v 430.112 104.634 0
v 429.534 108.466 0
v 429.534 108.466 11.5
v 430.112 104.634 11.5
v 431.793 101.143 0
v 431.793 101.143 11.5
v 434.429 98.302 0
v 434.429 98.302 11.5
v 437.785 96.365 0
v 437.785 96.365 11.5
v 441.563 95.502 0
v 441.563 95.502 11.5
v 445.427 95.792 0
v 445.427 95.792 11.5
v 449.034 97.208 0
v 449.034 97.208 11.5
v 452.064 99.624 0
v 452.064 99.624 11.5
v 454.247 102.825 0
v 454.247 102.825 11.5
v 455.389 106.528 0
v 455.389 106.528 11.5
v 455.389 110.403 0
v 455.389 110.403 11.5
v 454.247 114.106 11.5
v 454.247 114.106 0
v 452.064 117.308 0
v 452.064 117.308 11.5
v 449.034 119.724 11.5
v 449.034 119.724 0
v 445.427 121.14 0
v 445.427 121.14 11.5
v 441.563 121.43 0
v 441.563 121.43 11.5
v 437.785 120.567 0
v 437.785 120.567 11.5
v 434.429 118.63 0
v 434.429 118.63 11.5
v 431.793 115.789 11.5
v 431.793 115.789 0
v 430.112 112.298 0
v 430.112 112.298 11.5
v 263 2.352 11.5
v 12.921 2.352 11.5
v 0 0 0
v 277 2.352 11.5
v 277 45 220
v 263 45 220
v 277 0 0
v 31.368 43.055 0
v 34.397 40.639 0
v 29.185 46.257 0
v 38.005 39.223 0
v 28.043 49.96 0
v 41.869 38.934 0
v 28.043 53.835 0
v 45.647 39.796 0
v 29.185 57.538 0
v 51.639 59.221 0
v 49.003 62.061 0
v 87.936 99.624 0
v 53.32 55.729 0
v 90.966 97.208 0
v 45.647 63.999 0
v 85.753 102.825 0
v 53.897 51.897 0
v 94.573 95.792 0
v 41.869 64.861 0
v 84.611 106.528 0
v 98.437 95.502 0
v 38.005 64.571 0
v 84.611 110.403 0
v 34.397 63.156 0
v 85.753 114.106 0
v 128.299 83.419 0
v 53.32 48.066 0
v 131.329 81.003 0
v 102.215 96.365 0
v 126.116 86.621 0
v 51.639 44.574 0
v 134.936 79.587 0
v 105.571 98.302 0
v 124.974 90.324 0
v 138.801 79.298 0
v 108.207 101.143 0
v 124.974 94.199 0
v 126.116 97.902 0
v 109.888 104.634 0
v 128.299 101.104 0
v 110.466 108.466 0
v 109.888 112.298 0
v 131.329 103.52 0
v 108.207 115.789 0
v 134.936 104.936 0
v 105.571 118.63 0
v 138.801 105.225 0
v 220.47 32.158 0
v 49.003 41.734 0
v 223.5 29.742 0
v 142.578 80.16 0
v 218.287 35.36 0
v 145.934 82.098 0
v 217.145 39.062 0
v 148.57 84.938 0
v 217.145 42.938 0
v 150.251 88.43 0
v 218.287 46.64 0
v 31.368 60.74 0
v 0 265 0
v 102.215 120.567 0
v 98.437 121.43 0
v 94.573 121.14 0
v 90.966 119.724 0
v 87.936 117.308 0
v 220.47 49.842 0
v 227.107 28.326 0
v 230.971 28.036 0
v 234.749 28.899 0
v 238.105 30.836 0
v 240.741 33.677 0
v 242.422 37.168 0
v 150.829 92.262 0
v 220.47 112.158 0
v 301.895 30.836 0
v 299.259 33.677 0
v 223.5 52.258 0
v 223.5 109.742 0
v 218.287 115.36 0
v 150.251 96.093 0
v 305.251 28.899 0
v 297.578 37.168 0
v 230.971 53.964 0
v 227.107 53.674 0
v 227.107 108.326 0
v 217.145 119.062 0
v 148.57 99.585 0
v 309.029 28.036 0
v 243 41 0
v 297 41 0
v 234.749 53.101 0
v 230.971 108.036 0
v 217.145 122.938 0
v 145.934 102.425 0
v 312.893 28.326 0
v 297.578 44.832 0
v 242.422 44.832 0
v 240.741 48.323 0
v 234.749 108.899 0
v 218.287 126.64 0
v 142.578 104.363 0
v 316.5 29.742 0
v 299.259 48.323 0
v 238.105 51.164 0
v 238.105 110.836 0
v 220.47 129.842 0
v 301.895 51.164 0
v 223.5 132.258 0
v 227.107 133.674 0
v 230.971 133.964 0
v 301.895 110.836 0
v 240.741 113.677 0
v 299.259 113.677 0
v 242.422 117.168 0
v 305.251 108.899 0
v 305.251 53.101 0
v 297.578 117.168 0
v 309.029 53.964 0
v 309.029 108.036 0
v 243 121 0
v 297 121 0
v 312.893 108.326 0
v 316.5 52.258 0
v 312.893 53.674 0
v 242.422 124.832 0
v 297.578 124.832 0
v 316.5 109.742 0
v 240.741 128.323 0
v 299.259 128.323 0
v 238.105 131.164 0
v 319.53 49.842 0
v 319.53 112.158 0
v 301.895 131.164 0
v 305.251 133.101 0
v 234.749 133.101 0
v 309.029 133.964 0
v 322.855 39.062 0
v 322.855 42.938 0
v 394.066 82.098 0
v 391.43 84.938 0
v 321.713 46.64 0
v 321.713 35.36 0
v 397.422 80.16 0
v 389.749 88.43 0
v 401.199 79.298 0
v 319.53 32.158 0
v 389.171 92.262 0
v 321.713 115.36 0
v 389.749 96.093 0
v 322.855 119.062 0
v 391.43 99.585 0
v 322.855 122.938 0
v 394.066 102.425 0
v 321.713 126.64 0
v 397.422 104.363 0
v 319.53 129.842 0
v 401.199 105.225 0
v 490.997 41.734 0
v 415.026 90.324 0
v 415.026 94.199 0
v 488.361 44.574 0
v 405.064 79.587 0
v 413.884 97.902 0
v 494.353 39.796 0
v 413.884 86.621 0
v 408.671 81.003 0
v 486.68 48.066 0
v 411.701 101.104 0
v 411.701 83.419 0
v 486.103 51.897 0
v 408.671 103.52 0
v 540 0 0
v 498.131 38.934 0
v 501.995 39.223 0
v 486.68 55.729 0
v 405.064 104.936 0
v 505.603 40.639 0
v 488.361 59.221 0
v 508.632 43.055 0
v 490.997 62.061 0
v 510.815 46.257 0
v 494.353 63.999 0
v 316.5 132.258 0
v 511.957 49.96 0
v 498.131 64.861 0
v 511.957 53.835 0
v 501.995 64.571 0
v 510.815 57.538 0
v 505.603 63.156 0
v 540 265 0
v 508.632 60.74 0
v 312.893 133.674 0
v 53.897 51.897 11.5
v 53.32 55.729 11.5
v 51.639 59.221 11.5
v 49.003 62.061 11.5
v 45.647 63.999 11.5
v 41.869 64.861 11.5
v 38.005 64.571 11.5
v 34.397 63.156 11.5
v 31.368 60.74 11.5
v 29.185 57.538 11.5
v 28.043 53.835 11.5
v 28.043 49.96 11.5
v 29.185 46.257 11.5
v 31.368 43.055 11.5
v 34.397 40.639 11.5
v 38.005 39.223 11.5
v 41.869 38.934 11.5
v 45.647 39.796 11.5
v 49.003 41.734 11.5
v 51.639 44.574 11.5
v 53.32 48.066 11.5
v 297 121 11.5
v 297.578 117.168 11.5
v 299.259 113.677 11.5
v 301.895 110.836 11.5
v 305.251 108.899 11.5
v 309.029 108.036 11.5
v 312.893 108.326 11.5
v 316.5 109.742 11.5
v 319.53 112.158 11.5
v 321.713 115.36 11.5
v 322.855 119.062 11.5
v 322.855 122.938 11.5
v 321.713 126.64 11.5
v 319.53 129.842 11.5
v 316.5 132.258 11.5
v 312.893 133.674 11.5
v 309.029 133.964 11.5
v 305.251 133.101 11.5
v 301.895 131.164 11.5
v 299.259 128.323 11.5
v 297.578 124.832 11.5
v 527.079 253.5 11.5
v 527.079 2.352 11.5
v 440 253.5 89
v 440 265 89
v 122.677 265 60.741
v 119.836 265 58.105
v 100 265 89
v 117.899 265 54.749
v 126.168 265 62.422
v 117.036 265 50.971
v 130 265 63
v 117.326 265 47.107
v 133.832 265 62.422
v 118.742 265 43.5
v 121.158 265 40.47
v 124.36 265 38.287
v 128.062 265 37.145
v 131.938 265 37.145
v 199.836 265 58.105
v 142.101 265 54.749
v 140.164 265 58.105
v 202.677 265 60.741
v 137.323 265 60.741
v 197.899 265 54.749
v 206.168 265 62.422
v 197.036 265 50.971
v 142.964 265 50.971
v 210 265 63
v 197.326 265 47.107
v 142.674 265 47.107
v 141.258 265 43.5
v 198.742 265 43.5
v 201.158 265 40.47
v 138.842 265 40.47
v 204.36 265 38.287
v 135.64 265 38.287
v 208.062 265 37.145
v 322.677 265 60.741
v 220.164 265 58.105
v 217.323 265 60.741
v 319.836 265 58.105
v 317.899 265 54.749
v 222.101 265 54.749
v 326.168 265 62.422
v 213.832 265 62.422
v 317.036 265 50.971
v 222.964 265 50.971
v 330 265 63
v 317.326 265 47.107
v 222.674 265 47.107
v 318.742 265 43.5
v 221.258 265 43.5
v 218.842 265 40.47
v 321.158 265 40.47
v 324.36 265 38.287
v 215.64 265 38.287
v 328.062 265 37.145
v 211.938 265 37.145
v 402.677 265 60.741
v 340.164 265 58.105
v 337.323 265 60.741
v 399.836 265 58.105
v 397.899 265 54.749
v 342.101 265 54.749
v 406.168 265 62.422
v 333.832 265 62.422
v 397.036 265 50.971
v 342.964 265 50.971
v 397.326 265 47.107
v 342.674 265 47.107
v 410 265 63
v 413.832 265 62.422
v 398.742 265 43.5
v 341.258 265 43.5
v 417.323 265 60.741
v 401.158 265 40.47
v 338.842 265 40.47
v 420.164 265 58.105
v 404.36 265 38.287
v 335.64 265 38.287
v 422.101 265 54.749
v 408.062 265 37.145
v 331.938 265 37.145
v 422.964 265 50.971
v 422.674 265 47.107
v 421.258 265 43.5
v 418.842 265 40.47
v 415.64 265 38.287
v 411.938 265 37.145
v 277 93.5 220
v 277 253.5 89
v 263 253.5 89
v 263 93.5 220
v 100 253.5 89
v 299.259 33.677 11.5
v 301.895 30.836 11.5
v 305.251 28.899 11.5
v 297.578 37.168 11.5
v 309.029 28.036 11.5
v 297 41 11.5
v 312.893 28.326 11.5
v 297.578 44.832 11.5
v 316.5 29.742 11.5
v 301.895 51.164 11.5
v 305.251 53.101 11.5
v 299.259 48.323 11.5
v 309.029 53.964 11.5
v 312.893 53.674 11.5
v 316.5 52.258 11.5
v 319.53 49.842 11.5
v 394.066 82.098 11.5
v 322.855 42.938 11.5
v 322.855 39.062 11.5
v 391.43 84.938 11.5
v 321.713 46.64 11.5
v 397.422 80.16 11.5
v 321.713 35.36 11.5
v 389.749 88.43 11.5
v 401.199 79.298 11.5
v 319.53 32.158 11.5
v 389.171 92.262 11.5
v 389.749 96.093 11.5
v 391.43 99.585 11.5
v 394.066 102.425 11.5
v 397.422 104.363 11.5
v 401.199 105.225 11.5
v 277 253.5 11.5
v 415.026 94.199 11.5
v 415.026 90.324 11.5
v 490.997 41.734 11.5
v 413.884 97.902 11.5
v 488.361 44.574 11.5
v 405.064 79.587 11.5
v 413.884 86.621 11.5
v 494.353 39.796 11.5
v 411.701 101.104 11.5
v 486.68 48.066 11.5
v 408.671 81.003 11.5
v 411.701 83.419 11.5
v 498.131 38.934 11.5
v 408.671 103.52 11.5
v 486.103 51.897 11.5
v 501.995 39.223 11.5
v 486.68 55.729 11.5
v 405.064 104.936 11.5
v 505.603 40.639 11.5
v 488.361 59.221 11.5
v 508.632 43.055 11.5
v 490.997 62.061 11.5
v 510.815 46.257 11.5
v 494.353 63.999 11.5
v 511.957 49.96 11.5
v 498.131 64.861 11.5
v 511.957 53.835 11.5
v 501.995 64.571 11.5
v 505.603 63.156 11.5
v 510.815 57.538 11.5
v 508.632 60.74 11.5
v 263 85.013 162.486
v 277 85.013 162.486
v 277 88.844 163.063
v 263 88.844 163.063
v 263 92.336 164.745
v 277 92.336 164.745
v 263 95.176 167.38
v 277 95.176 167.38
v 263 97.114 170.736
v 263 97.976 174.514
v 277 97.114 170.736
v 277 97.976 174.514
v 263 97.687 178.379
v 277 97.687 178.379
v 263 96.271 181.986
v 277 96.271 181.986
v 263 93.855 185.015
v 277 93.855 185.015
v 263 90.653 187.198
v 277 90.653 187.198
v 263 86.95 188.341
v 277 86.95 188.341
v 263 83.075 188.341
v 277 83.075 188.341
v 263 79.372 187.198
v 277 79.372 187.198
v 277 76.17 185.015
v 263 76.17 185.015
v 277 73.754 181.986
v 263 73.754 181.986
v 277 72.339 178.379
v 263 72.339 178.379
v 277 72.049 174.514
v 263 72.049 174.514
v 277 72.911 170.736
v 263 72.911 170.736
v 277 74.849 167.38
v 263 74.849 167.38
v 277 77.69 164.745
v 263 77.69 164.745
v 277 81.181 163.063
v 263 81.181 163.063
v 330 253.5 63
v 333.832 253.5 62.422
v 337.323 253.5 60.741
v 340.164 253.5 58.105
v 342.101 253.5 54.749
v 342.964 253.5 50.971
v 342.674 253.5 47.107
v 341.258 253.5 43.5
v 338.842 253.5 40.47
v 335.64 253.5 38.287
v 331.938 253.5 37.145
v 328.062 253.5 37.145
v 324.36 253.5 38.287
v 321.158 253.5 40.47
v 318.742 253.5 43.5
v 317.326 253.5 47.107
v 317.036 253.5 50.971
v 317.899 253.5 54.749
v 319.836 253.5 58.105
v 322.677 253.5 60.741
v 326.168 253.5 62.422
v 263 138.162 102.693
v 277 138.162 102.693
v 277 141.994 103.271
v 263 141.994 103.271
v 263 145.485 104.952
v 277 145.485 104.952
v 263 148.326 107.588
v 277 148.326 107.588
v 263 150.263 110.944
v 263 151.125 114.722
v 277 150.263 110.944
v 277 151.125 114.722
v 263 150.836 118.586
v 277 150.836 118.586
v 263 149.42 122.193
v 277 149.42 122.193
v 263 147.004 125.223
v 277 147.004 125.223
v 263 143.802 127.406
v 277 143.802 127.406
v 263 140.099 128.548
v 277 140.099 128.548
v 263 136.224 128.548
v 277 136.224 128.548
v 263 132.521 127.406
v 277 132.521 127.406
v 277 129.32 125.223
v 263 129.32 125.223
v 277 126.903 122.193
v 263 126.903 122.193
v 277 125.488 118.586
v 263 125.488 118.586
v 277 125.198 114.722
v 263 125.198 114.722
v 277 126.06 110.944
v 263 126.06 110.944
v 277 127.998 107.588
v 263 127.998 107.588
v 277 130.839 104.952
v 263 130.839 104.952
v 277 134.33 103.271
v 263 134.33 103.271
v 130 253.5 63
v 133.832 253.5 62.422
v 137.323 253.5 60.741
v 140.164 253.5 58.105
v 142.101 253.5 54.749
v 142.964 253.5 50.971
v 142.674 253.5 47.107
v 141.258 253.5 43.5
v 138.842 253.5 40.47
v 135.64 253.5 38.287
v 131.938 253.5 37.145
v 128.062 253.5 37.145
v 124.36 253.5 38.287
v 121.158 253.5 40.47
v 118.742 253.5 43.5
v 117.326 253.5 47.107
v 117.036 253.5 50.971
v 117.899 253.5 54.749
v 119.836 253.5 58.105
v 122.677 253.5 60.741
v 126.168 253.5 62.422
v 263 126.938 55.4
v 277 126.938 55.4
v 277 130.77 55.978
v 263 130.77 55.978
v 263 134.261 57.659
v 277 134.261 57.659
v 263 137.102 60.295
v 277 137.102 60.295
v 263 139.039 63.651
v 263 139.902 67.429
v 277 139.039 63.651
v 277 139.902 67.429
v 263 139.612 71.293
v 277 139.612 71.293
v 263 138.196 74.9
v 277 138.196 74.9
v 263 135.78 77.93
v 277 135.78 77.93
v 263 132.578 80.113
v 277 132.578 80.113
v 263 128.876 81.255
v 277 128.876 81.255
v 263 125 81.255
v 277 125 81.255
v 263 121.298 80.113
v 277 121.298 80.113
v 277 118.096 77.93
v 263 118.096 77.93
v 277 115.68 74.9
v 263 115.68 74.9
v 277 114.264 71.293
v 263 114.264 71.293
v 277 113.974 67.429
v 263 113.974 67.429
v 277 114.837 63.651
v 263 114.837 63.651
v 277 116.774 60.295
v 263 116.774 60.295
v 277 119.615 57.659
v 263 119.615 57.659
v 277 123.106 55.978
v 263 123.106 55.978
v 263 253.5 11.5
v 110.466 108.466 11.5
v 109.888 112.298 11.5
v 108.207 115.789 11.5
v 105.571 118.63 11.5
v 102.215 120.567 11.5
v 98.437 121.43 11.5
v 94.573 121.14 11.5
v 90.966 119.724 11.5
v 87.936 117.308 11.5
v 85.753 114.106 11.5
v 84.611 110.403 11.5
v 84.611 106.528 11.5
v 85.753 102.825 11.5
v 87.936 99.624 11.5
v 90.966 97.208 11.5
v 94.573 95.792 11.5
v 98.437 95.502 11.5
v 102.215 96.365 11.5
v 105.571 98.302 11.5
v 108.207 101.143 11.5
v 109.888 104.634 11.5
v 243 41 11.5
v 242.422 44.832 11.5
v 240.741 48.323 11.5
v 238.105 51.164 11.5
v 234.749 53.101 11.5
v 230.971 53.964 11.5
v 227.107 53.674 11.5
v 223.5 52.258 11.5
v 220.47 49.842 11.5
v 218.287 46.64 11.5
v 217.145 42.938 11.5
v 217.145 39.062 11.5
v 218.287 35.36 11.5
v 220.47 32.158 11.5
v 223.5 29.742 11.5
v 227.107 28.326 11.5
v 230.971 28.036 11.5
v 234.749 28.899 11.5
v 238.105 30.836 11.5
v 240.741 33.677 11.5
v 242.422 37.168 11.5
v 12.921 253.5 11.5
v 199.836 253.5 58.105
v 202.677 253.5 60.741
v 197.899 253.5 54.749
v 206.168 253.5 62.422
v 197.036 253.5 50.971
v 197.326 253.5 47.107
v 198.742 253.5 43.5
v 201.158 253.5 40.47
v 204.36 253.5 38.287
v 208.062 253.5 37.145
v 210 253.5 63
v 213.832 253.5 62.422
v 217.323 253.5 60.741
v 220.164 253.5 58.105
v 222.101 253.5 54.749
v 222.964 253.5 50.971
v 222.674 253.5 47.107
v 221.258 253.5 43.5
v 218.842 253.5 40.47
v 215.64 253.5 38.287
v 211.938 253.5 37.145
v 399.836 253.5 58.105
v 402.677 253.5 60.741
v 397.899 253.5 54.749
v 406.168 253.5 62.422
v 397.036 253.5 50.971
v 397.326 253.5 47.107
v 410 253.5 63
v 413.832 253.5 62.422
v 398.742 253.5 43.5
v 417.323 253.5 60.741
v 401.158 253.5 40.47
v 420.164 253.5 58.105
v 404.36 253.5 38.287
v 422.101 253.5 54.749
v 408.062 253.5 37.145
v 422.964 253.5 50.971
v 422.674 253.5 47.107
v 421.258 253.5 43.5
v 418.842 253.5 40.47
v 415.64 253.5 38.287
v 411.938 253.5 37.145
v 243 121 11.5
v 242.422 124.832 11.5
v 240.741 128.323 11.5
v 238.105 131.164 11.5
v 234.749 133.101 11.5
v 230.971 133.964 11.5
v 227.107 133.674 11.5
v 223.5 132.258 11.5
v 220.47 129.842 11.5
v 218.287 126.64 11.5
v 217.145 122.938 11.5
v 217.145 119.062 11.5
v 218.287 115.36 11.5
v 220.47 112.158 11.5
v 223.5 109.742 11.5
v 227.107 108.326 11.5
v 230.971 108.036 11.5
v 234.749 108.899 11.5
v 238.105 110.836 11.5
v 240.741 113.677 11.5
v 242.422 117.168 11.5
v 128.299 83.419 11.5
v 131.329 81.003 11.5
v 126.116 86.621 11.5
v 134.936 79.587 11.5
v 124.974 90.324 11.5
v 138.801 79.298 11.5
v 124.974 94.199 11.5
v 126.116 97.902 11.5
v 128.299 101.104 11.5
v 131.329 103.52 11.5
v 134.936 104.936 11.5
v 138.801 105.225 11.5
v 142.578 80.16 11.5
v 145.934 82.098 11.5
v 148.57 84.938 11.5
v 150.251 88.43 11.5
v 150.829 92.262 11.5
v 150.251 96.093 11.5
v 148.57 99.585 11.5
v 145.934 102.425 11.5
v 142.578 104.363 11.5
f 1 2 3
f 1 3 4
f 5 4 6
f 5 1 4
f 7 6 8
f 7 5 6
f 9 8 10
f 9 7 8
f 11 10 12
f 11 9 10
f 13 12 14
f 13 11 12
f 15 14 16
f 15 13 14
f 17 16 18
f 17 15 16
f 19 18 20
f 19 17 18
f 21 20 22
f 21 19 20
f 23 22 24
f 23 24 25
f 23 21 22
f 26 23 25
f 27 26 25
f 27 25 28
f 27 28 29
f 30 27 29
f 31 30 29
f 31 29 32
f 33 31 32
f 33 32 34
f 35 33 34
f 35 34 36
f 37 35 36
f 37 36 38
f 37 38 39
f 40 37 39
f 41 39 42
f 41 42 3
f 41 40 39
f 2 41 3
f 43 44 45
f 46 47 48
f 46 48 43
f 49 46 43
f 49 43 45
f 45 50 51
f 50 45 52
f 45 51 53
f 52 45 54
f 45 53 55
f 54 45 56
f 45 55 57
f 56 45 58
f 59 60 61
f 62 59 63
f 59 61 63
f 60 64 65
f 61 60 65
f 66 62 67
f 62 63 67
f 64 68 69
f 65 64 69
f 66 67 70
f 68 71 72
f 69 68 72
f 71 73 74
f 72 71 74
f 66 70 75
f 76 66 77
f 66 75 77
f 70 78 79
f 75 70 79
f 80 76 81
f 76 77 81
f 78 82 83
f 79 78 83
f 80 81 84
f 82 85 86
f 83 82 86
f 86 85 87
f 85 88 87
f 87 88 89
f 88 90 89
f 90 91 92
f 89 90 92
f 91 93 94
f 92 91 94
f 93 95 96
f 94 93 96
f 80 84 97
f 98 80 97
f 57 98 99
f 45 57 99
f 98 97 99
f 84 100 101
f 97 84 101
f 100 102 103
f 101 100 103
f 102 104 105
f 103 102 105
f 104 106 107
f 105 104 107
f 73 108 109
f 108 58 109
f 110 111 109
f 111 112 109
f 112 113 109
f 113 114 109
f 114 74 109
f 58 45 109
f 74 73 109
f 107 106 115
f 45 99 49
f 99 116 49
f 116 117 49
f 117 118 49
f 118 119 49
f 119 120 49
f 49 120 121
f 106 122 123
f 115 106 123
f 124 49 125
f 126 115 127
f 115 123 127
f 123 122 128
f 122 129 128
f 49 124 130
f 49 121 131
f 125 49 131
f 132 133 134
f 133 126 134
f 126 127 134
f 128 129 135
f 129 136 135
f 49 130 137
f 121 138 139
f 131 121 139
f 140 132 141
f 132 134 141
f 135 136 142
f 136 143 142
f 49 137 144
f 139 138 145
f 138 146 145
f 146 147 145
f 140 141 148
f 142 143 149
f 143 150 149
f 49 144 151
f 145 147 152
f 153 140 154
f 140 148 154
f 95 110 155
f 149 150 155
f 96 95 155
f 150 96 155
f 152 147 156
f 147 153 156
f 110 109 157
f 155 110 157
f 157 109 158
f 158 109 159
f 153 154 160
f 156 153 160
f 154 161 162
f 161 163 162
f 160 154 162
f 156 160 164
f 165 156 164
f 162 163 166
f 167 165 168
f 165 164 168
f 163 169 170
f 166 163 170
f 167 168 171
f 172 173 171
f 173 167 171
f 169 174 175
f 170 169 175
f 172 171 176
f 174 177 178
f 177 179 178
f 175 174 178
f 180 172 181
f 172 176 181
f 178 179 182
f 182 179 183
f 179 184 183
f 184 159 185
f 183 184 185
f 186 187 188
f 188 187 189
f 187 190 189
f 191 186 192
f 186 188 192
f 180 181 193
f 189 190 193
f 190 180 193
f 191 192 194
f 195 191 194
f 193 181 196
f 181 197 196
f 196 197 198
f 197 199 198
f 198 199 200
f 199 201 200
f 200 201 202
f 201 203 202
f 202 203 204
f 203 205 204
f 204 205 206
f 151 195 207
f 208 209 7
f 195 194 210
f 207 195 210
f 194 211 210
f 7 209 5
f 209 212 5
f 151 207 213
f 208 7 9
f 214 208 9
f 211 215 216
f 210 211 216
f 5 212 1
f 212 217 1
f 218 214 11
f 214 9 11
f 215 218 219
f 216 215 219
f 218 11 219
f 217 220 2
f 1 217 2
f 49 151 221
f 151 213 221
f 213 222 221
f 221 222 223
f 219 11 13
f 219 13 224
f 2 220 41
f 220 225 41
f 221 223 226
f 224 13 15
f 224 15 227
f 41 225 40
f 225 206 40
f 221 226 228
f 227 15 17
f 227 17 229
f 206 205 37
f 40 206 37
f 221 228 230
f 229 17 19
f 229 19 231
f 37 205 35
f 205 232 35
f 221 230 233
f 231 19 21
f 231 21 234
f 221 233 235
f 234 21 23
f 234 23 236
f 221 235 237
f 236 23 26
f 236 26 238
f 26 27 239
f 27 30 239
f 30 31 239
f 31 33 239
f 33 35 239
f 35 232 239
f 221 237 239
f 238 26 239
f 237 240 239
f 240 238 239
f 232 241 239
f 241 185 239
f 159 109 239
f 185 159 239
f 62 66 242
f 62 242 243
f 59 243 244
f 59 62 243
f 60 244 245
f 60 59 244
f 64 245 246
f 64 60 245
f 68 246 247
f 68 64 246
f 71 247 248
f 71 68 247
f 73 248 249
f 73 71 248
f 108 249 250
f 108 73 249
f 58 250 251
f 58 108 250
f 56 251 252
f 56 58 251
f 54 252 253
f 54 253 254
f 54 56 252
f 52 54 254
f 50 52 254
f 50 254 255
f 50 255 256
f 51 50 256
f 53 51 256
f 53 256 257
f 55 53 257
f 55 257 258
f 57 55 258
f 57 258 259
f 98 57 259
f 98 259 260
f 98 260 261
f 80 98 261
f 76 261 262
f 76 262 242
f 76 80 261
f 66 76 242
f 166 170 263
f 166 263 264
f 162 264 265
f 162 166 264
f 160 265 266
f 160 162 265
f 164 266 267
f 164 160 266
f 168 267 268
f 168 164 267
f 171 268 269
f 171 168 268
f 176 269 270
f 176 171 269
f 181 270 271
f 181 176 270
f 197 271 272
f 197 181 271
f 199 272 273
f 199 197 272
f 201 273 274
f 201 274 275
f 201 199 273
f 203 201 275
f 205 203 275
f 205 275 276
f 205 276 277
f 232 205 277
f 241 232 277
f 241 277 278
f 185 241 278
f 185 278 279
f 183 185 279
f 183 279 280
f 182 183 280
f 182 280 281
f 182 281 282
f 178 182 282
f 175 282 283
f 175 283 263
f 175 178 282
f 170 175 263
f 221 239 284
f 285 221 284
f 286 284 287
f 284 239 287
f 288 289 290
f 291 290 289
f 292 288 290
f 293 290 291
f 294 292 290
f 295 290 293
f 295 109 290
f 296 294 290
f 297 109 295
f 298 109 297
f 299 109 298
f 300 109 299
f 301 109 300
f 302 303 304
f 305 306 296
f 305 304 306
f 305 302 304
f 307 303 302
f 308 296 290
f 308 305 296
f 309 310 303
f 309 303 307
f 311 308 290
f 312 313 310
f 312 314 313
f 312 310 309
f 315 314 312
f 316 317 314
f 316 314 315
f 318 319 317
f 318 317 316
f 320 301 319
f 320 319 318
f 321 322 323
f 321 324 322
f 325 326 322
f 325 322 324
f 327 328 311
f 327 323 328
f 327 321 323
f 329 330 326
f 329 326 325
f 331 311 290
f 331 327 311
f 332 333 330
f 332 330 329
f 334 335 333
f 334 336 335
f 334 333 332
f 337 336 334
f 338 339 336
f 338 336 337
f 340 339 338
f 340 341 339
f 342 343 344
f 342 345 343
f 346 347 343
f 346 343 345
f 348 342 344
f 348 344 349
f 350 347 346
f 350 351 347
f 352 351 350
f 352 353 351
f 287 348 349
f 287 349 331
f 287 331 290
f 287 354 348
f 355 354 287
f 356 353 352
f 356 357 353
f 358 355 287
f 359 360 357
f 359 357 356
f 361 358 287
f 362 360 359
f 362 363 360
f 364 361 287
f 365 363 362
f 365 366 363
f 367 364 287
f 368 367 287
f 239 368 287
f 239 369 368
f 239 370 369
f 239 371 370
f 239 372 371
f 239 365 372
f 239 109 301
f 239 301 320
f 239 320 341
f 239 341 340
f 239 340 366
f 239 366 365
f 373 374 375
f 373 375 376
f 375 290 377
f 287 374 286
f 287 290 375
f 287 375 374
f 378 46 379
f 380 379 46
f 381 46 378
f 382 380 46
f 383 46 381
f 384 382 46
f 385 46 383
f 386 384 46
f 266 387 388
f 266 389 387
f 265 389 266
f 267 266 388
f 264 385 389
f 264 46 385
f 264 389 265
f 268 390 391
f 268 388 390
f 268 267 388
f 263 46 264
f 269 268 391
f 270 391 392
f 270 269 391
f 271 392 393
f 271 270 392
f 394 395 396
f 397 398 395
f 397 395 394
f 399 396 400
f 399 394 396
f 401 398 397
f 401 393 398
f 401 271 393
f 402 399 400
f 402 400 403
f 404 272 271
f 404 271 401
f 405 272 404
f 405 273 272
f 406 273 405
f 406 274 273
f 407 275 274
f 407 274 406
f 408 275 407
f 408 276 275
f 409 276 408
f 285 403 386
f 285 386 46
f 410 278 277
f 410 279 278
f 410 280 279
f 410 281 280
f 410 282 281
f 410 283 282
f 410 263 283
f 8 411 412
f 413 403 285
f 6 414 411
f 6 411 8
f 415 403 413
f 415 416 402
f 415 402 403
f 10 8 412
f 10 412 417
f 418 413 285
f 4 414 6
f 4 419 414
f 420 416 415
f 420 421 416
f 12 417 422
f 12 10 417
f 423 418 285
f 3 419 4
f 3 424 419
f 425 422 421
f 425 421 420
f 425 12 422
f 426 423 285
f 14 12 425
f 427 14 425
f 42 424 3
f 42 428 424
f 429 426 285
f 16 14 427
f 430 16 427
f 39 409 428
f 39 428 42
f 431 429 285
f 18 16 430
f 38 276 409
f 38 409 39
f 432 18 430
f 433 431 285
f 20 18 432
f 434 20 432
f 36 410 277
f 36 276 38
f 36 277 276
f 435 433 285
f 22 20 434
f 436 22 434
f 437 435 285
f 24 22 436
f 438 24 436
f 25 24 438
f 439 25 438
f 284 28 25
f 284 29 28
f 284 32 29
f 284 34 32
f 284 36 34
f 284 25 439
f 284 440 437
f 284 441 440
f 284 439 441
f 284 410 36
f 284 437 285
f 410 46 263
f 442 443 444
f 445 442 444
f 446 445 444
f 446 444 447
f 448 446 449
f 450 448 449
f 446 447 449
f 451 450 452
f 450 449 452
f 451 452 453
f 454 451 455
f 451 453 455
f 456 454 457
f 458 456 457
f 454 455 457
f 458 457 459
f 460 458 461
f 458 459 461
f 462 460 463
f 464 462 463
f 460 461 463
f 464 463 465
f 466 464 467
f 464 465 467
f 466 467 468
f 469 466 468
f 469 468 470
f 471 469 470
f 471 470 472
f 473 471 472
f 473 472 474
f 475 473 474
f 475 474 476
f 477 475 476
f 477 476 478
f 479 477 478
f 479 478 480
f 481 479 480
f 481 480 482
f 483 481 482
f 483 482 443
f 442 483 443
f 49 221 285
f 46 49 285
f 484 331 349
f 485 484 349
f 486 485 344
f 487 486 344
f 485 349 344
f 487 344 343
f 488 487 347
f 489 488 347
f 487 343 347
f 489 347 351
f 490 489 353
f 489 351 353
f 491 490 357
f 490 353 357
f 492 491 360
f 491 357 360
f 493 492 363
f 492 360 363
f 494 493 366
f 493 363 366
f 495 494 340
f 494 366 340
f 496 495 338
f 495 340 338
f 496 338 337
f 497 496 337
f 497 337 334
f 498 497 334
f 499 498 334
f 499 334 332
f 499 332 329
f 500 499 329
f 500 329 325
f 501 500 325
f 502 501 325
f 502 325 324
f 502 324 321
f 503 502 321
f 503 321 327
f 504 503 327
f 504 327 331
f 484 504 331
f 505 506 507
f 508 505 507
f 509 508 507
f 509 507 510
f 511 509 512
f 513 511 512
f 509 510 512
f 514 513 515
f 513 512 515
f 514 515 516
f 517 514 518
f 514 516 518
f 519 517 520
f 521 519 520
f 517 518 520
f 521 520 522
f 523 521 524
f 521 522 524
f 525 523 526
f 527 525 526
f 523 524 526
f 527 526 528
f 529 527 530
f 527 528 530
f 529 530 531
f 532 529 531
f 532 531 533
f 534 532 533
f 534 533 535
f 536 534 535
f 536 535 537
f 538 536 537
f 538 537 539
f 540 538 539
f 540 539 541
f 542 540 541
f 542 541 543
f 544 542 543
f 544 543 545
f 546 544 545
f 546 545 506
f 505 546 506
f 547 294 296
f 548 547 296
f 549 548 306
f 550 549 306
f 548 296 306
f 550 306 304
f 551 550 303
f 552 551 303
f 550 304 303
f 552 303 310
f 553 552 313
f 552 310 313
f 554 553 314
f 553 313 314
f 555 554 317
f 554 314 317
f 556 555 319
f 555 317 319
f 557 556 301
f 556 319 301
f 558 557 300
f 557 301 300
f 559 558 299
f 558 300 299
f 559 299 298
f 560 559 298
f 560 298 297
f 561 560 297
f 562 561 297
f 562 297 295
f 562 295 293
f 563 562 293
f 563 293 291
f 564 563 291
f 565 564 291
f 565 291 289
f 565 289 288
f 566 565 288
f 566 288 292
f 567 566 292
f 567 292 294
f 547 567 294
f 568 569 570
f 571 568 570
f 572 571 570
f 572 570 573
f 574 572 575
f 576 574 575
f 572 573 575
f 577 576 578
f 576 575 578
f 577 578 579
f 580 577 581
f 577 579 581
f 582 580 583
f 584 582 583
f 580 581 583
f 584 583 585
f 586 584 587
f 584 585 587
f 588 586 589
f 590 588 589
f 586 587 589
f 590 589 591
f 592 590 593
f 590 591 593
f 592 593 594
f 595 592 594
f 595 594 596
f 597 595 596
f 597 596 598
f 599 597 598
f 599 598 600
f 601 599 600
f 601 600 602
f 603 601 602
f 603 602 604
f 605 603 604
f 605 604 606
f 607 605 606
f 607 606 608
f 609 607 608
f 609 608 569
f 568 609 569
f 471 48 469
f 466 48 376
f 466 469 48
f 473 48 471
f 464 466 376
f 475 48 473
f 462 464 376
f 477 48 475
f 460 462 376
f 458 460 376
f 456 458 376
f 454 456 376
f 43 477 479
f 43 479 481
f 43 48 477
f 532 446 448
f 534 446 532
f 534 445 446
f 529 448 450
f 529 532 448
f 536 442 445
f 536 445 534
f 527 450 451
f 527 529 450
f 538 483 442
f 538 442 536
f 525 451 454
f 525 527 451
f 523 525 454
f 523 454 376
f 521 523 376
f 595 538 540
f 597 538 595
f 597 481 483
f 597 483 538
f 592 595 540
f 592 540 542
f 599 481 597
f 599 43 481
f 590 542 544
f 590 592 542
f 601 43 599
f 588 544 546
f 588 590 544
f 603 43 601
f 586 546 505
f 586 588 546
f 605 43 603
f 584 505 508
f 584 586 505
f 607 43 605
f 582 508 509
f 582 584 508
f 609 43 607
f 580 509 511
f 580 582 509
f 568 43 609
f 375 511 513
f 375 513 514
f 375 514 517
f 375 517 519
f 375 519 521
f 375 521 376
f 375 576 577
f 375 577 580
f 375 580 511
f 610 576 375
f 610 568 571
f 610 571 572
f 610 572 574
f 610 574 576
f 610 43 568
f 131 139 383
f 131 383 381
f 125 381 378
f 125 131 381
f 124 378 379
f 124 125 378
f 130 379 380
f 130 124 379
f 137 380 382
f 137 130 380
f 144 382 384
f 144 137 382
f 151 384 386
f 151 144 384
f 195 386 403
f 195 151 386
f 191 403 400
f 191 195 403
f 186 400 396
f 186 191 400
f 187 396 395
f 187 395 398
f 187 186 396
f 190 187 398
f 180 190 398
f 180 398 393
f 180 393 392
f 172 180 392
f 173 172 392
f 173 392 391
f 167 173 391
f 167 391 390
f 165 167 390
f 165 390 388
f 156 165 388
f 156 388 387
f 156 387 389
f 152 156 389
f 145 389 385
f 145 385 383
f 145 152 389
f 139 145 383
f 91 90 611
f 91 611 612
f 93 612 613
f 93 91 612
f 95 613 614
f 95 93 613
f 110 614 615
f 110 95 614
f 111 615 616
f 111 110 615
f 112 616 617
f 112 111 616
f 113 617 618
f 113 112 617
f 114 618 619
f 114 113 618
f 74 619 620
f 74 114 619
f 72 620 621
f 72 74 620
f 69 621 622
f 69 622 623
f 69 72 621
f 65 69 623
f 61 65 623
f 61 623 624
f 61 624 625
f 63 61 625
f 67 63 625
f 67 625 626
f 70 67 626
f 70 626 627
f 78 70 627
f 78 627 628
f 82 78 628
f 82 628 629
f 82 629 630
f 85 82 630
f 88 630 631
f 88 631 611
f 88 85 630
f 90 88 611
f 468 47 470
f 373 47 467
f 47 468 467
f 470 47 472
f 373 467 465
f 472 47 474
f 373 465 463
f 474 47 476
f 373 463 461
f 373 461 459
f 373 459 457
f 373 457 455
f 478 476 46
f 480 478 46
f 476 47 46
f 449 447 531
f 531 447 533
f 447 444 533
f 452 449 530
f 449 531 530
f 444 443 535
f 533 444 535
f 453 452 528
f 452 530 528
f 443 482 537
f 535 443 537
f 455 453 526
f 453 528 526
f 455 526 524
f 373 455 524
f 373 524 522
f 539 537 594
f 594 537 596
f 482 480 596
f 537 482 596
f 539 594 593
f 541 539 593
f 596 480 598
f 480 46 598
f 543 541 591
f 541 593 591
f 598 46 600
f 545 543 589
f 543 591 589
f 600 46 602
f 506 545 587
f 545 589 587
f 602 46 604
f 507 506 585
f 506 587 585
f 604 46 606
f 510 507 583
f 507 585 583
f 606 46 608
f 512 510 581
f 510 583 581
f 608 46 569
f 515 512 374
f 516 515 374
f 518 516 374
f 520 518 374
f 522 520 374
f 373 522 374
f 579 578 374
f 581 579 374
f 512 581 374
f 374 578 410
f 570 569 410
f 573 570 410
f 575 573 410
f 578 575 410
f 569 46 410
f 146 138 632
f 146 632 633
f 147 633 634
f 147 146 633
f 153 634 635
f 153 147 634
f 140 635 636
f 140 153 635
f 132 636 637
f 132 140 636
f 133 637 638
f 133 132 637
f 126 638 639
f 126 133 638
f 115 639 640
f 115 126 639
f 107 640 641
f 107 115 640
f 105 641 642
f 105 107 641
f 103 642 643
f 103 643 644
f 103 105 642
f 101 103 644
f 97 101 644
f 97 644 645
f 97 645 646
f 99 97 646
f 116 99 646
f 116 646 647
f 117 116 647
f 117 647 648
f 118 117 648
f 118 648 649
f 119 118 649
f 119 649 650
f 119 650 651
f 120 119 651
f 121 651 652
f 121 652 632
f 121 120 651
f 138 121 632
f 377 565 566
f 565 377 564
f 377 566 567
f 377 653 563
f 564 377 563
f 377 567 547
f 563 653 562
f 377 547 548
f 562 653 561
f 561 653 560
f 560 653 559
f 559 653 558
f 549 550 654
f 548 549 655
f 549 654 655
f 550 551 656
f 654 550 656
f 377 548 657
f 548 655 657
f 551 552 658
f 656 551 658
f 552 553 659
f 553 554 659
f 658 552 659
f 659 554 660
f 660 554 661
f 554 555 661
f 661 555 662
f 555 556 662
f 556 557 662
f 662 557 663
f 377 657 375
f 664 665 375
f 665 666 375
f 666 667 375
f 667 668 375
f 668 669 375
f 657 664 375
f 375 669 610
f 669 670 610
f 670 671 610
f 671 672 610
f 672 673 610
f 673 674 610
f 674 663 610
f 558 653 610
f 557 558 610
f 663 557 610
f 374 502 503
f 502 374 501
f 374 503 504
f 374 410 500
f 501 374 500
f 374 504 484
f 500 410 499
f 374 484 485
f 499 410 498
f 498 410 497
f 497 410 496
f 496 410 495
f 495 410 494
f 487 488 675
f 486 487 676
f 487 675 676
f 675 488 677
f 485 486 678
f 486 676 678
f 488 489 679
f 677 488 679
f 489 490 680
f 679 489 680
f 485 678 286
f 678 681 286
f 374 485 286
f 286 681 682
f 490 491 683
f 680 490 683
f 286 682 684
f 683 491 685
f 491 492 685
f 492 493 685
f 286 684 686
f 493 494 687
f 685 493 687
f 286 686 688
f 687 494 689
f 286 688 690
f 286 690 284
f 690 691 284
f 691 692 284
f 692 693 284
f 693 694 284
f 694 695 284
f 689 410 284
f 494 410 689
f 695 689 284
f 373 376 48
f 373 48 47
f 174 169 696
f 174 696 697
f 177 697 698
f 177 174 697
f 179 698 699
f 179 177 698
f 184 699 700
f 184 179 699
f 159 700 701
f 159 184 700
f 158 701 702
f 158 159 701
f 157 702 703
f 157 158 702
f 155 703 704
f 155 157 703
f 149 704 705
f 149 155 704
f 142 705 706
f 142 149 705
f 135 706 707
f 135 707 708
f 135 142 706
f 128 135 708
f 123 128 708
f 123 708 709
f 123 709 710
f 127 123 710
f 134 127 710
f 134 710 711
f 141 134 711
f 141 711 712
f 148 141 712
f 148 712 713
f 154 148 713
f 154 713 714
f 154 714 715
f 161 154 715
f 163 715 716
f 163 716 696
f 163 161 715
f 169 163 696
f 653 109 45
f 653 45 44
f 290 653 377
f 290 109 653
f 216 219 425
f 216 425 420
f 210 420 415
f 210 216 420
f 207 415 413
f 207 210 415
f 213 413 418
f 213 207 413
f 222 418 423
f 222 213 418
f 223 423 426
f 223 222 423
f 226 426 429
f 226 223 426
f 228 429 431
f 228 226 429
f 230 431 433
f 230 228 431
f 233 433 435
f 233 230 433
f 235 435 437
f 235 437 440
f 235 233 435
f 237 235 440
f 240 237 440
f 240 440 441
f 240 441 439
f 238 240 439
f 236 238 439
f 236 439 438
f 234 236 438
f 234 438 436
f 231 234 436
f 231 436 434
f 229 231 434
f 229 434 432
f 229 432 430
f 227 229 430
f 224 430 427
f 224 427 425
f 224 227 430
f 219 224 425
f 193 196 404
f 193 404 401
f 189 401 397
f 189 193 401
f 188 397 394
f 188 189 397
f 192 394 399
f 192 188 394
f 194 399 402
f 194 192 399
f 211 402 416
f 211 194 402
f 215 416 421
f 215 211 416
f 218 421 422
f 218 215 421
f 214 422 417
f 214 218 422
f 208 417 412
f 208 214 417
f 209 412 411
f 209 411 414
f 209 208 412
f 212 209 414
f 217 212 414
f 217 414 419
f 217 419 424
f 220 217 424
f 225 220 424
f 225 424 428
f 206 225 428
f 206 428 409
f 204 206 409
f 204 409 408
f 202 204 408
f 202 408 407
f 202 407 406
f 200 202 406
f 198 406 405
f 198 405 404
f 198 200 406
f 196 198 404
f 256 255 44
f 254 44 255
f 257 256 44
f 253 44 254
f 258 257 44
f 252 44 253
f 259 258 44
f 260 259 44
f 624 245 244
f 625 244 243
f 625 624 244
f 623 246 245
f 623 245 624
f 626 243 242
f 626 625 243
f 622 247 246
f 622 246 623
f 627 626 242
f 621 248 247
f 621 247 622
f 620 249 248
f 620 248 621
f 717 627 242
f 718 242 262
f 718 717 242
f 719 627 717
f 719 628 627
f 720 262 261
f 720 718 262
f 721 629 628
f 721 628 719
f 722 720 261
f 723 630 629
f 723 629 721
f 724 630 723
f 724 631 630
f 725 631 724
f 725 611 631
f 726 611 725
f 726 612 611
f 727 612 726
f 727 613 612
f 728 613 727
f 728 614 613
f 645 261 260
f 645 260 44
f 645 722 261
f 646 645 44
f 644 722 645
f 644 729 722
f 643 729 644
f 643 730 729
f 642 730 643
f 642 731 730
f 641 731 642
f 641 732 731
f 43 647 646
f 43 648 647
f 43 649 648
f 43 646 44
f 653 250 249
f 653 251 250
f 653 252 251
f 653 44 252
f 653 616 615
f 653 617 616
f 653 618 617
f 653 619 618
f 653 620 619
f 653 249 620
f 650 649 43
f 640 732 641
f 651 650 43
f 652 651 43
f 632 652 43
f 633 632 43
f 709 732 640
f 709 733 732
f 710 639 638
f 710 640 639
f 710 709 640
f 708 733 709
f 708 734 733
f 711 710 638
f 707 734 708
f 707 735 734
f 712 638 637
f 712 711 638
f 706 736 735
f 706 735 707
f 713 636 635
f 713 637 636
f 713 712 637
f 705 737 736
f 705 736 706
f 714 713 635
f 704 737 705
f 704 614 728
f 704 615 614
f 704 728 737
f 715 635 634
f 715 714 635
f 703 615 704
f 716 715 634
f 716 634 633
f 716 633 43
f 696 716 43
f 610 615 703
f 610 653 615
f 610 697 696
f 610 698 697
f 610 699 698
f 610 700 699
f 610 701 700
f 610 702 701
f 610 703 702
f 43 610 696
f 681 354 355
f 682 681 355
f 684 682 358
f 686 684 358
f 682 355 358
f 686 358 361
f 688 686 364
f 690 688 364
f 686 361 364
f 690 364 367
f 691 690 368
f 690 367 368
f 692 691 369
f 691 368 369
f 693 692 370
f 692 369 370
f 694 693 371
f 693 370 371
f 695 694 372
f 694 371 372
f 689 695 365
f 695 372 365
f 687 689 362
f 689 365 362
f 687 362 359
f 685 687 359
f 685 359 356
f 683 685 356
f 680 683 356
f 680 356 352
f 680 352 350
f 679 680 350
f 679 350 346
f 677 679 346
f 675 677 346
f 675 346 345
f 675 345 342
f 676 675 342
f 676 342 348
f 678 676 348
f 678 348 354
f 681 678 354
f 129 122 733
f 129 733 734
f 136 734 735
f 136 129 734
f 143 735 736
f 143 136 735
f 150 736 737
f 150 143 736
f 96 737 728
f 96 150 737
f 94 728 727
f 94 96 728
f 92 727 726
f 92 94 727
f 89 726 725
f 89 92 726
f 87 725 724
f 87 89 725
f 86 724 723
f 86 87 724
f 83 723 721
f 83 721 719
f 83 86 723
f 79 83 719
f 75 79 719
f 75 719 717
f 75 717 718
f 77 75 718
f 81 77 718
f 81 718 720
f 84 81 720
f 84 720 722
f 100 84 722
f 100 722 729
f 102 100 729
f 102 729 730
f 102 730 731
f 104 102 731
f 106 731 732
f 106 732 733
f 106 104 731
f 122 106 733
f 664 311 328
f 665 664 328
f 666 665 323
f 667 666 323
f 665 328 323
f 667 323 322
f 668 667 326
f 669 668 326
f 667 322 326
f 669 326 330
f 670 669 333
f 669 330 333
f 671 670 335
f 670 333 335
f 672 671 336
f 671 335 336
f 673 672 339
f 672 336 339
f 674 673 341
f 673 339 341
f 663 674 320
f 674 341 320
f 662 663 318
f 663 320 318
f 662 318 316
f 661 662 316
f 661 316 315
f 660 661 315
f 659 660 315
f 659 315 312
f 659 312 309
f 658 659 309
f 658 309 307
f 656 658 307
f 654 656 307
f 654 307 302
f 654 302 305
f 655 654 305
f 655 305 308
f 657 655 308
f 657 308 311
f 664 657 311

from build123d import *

# Parameters (mm, degrees)
SKETCH_1_W          = 540
SKETCH_1_H          = 265
SKETCH_1_R          = 13
EXTRUDE_548_DEPTH   = 11.5
SKETCH_2_W          = 540
SKETCH_2_H          = 11.5
EXTRUDE_1_DEPTH     = 77.5
CUT_EXTRUDE_1_DEPTH = 609.067430471
SKETCH_4_R          = 13
CUT_EXTRUDE_2_DEPTH = 609.067430471
SKETCH_5_W          = 14
SKETCH_5_H          = 253.5
EXTRUDE_2_DEPTH     = 208.5
SKETCH_6_R          = 13
CUT_EXTRUDE_3_DEPTH = 442.988687638
CUT_EXTRUDE_4_DEPTH = 442.988687638


with BuildPart() as part:
    # 草图1 → Extrude 548 (new body)
    with BuildSketch(Plane.XY):
        with Locations((270, 132.5)):
            Rectangle(SKETCH_1_W, SKETCH_1_H)
        with Locations((97.46594539, 108.46594539)):
            Circle(SKETCH_1_R, mode=Mode.SUBTRACT)
        with Locations((40.897402896, 51.897402896)):
            Circle(SKETCH_1_R, mode=Mode.SUBTRACT)
        with Locations(Location((499.102597104, 51.897402896, 0), (0, 0, 180))):
            Circle(SKETCH_1_R, mode=Mode.SUBTRACT)
        with Locations(Location((402.170987639, 92.261534081, 0), (0, 0, 180))):
            Circle(SKETCH_1_R, mode=Mode.SUBTRACT)
        with Locations((230, 121)):
            Circle(SKETCH_1_R, mode=Mode.SUBTRACT)
        with Locations((230, 41)):
            Circle(SKETCH_1_R, mode=Mode.SUBTRACT)
        with Locations(Location((310, 41, 0), (0, 0, 180))):
            Circle(SKETCH_1_R, mode=Mode.SUBTRACT)
        with Locations(Location((310, 121, 0), (0, 0, 180))):
            Circle(SKETCH_1_R, mode=Mode.SUBTRACT)
        with Locations((137.829012361, 92.261534081)):
            Circle(SKETCH_1_R, mode=Mode.SUBTRACT)
        with Locations(Location((442.53405461, 108.46594539, 0), (0, 0, 180))):
            Circle(SKETCH_1_R, mode=Mode.SUBTRACT)
    extrude(amount=EXTRUDE_548_DEPTH)

    # 草图2 → 凸台-拉伸1 (add)
    with BuildSketch(Plane.XY.offset(11.5)):
        with Locations((270, 259.25)):
            Rectangle(SKETCH_2_W, SKETCH_2_H)
    extrude(amount=EXTRUDE_1_DEPTH)

    # 草图3 → 切除-拉伸1 (cut, through all)
    with BuildSketch(Plane(origin=(0, 265, 0), x_dir=(-1, 0, 0), z_dir=(0, 1, 0))):
        Polygon((0, 0), (-100, 89), (0, 89), align=None)
        Polygon((-540, 0), (-440, 89), (-540, 89), align=None)
    extrude(amount=-CUT_EXTRUDE_1_DEPTH, mode=Mode.SUBTRACT)

    # 草图4 → 切除-拉伸2 (cut, through all)
    with BuildSketch(Plane(origin=(0, 265, 0), x_dir=(-1, 0, 0), z_dir=(0, 1, 0))):
        with Locations(Location((-210, 50, 0), (0, 0, 90))):
            Circle(SKETCH_4_R)
        with Locations(Location((-130, 50, 0), (0, 0, 90))):
            Circle(SKETCH_4_R)
        with Locations(Location((-410, 50, 0), (0, 0, 90))):
            Circle(SKETCH_4_R)
        with Locations(Location((-330, 50, 0), (0, 0, 90))):
            Circle(SKETCH_4_R)
    extrude(amount=-CUT_EXTRUDE_2_DEPTH, mode=Mode.SUBTRACT)

    # 草图5 → 凸台-拉伸2 (add)
    with BuildSketch(Plane.XY.offset(11.5)):
        with Locations((270, 126.75)):
            Rectangle(SKETCH_5_W, SKETCH_5_H)
    extrude(amount=EXTRUDE_2_DEPTH)

    # 草图6 → 切除-拉伸3 (cut, through all)
    with BuildSketch(Plane(origin=(277, 0, 0), x_dir=(0, 0, -1), z_dir=(1, 0, 0))):
        with Locations((-115.693003517, 138.161774652)):
            Circle(SKETCH_6_R)
        with Locations((-175.485749012, 85.012667545)):
            Circle(SKETCH_6_R)
        with Locations((-68.400421337, 126.93798921)):
            Circle(SKETCH_6_R)
        Polygon((-89, 253.5), (-220, 93.5), (-220, 253.5), align=None)
        Polygon((-220, 45), (0, 0), (-220, 0), align=None)
    extrude(amount=-CUT_EXTRUDE_3_DEPTH, mode=Mode.SUBTRACT)

    # 草图7 → 切除-拉伸4 (cut, through all)
    with BuildSketch(Plane.ZY.offset(-277)):
        Polygon((0, 0), (11.5, 2.352272727), (11.5, 0), align=None)
    extrude(amount=-CUT_EXTRUDE_4_DEPTH, mode=Mode.SUBTRACT)


solid = part.part
